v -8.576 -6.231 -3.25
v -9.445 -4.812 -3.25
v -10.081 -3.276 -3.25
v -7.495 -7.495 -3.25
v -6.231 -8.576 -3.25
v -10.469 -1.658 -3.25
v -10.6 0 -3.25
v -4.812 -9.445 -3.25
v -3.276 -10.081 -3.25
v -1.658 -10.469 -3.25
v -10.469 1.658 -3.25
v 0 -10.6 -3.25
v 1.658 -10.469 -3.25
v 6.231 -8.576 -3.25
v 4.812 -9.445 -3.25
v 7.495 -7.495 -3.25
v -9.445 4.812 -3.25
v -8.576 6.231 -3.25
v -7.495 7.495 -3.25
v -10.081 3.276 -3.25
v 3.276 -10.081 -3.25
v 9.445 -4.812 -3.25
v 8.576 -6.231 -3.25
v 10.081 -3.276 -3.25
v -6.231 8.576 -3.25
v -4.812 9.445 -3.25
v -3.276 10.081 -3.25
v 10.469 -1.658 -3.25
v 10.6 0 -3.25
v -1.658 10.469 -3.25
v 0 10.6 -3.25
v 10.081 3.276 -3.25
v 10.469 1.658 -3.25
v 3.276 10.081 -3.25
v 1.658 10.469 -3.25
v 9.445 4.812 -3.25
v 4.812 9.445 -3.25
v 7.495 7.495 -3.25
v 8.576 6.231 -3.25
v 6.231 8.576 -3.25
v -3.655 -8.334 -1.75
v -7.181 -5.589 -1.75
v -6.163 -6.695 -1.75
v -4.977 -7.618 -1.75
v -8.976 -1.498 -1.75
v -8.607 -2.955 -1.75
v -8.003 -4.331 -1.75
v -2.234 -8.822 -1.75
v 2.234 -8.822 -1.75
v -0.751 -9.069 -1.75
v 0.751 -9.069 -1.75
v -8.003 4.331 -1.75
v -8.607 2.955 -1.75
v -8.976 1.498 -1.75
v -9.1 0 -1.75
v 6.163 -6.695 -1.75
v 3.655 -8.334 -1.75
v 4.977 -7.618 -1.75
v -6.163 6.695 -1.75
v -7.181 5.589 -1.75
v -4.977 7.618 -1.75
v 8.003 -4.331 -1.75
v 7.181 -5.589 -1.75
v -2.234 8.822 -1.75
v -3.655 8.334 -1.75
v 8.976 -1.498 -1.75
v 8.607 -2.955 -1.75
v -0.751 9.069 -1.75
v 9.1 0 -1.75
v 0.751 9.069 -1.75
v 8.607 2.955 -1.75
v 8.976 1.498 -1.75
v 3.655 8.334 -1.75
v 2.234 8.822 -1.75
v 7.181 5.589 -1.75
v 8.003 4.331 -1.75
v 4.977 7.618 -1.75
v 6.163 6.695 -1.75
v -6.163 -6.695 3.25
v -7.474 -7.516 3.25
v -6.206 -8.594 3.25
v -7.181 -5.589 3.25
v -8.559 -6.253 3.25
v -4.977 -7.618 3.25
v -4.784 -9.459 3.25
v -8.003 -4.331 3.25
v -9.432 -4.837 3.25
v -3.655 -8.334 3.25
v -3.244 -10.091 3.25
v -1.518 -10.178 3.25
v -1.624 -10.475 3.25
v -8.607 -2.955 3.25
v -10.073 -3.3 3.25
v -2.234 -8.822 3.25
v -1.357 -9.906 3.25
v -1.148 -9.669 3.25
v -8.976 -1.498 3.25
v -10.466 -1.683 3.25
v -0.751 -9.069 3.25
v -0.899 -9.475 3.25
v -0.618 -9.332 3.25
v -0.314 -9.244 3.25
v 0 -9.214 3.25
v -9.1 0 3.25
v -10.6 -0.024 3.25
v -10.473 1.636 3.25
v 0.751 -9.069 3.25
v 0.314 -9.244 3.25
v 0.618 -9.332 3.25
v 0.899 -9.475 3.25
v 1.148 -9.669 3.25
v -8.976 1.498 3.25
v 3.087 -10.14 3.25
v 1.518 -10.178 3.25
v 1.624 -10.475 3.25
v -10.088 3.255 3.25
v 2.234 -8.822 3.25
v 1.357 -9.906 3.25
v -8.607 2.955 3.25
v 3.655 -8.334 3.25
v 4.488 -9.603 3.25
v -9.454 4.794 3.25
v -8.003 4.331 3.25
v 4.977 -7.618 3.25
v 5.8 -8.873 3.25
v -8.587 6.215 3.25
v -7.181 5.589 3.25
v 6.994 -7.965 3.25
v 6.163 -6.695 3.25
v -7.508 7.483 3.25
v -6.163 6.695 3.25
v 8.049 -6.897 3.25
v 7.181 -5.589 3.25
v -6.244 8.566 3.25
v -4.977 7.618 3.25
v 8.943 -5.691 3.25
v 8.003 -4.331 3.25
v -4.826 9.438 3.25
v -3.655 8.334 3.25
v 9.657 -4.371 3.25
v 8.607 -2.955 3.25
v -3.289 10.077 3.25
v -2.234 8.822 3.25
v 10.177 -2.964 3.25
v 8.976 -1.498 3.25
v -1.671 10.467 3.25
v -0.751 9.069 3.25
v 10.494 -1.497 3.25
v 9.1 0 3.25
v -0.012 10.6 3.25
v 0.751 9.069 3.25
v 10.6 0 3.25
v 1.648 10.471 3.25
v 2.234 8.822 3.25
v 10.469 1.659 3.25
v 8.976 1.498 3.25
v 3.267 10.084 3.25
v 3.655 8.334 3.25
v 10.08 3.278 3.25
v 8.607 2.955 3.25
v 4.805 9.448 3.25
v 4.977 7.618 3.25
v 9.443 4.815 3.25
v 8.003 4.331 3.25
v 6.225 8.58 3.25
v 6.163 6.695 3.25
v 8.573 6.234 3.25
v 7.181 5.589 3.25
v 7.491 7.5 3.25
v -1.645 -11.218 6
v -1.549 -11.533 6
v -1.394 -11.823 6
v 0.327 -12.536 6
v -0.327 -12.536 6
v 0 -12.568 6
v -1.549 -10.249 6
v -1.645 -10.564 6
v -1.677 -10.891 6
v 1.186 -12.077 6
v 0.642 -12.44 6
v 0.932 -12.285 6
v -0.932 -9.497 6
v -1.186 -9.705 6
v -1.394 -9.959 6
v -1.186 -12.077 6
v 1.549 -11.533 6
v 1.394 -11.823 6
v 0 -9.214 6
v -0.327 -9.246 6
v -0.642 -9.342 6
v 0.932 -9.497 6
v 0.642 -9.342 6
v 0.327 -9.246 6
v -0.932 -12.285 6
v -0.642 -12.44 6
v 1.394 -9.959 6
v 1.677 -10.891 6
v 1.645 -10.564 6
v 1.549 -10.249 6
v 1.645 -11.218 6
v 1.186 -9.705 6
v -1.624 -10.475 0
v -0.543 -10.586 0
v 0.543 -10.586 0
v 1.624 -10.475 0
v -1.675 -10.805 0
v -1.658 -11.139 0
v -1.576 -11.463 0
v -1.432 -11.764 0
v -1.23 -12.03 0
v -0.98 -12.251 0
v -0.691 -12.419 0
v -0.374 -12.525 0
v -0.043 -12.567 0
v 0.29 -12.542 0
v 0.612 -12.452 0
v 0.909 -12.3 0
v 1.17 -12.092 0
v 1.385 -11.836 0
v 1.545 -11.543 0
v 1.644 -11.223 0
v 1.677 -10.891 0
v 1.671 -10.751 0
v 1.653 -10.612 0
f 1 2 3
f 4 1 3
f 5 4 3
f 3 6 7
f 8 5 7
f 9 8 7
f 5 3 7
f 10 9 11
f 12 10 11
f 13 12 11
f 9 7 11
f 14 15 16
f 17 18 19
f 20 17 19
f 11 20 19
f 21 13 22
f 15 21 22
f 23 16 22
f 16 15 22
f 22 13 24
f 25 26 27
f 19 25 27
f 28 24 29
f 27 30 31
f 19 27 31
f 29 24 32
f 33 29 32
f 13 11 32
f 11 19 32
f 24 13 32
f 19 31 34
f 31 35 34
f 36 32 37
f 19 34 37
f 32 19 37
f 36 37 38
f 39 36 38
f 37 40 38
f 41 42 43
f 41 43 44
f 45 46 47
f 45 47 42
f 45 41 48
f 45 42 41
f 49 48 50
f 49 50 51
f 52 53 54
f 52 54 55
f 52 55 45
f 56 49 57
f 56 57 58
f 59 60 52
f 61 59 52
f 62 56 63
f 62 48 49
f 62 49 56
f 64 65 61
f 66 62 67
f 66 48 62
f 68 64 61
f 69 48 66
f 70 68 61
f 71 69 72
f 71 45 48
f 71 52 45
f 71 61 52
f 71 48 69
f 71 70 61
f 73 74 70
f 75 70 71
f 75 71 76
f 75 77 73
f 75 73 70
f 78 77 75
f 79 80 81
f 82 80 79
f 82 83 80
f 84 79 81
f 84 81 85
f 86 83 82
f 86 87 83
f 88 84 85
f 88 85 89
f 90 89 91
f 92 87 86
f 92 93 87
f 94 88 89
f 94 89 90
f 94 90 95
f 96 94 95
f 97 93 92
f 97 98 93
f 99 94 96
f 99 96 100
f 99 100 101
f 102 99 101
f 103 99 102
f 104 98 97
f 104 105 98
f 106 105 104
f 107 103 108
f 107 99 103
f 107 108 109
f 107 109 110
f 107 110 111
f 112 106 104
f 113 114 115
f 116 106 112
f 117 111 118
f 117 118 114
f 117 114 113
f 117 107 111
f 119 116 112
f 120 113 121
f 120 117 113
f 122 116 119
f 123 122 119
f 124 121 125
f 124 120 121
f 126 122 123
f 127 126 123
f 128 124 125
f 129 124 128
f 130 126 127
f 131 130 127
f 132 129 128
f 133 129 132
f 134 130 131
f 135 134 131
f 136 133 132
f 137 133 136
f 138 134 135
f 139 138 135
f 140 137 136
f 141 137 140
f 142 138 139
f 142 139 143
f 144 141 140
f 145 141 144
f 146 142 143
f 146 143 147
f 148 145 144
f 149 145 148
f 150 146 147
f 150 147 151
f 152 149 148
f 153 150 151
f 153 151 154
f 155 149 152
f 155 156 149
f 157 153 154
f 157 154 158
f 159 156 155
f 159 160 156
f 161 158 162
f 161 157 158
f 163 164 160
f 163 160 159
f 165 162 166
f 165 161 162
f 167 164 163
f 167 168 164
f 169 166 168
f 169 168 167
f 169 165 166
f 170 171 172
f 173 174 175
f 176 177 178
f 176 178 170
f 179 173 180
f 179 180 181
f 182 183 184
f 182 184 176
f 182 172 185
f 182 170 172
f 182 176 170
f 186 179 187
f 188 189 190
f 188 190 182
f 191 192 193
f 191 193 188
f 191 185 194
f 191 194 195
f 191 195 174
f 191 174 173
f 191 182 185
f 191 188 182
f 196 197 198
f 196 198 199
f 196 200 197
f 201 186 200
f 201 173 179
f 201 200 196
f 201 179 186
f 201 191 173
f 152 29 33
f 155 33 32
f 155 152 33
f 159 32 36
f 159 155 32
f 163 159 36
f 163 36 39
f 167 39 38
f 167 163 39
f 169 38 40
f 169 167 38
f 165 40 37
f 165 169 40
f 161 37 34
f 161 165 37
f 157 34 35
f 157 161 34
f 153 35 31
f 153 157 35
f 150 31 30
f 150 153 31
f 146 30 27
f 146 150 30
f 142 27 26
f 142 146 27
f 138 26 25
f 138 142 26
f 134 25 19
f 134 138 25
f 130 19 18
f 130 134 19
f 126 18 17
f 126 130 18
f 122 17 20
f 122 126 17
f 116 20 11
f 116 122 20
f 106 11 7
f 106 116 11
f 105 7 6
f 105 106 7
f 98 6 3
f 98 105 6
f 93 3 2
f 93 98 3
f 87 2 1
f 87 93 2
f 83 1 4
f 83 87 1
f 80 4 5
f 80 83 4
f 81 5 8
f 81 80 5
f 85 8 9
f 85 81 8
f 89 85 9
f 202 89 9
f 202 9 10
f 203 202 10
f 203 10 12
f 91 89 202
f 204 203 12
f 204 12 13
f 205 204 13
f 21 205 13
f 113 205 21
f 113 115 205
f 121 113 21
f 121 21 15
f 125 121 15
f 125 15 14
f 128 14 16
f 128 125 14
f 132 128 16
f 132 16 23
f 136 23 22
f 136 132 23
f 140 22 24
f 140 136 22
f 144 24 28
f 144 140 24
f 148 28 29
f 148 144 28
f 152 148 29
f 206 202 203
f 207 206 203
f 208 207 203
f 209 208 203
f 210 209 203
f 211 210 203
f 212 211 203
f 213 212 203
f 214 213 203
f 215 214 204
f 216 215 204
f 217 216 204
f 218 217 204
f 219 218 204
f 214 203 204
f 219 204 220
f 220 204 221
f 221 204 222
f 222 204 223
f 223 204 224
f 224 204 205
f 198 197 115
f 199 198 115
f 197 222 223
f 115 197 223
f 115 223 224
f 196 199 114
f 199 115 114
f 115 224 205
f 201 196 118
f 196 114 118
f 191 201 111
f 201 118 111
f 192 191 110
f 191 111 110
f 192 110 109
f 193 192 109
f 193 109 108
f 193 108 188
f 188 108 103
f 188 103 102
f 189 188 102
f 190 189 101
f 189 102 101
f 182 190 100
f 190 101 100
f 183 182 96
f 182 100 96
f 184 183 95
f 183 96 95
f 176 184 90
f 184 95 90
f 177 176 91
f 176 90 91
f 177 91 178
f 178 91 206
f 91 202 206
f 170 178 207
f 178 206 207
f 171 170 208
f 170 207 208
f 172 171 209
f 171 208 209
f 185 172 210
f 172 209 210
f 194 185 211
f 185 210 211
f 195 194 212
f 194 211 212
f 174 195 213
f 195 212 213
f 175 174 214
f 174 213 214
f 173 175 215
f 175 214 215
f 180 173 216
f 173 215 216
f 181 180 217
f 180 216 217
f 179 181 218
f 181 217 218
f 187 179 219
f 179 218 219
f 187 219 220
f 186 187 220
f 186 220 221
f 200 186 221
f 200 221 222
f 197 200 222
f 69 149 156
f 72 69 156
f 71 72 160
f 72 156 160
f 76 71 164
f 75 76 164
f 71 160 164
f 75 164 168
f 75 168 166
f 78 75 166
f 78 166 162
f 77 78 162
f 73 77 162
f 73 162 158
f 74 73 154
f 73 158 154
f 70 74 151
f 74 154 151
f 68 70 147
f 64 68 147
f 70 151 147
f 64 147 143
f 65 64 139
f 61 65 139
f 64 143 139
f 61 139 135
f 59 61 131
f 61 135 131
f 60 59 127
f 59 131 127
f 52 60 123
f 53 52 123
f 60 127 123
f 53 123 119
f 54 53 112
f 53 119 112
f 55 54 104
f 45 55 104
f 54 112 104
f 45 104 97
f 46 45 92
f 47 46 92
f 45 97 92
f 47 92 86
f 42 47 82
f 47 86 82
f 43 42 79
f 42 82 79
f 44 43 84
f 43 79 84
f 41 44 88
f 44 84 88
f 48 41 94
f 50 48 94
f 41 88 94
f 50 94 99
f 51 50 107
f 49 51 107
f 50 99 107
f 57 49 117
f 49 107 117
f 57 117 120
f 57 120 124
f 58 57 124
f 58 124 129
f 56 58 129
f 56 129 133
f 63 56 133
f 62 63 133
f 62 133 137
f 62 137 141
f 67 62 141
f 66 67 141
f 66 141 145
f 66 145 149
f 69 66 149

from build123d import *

# Parameters (mm, degrees)
F0_R     = 10.6
F1_DEPTH = 3.25
F2_T     = -1.5
F3_R     = 1.676803
F4_DEPTH = 6


with BuildPart() as f1:
    # F0 (on Top) → F1 (new body, symmetric)
    with BuildSketch(Plane.XY):
        Circle(F0_R)
    extrude(amount=F1_DEPTH, both=True)

    # F2
    f2_openings = [f1.faces().sort_by_distance(p)[0] for p in [
        (0, 0, 3.25),
    ]]
    offset(amount=F2_T, openings=f2_openings)

    # F3 (on Top) → F4 (join)
    with BuildSketch(Plane.XY):
        with Locations((0, -10.890958)):
            Circle(F3_R)
    extrude(amount=F4_DEPTH)


solid = f1.part
